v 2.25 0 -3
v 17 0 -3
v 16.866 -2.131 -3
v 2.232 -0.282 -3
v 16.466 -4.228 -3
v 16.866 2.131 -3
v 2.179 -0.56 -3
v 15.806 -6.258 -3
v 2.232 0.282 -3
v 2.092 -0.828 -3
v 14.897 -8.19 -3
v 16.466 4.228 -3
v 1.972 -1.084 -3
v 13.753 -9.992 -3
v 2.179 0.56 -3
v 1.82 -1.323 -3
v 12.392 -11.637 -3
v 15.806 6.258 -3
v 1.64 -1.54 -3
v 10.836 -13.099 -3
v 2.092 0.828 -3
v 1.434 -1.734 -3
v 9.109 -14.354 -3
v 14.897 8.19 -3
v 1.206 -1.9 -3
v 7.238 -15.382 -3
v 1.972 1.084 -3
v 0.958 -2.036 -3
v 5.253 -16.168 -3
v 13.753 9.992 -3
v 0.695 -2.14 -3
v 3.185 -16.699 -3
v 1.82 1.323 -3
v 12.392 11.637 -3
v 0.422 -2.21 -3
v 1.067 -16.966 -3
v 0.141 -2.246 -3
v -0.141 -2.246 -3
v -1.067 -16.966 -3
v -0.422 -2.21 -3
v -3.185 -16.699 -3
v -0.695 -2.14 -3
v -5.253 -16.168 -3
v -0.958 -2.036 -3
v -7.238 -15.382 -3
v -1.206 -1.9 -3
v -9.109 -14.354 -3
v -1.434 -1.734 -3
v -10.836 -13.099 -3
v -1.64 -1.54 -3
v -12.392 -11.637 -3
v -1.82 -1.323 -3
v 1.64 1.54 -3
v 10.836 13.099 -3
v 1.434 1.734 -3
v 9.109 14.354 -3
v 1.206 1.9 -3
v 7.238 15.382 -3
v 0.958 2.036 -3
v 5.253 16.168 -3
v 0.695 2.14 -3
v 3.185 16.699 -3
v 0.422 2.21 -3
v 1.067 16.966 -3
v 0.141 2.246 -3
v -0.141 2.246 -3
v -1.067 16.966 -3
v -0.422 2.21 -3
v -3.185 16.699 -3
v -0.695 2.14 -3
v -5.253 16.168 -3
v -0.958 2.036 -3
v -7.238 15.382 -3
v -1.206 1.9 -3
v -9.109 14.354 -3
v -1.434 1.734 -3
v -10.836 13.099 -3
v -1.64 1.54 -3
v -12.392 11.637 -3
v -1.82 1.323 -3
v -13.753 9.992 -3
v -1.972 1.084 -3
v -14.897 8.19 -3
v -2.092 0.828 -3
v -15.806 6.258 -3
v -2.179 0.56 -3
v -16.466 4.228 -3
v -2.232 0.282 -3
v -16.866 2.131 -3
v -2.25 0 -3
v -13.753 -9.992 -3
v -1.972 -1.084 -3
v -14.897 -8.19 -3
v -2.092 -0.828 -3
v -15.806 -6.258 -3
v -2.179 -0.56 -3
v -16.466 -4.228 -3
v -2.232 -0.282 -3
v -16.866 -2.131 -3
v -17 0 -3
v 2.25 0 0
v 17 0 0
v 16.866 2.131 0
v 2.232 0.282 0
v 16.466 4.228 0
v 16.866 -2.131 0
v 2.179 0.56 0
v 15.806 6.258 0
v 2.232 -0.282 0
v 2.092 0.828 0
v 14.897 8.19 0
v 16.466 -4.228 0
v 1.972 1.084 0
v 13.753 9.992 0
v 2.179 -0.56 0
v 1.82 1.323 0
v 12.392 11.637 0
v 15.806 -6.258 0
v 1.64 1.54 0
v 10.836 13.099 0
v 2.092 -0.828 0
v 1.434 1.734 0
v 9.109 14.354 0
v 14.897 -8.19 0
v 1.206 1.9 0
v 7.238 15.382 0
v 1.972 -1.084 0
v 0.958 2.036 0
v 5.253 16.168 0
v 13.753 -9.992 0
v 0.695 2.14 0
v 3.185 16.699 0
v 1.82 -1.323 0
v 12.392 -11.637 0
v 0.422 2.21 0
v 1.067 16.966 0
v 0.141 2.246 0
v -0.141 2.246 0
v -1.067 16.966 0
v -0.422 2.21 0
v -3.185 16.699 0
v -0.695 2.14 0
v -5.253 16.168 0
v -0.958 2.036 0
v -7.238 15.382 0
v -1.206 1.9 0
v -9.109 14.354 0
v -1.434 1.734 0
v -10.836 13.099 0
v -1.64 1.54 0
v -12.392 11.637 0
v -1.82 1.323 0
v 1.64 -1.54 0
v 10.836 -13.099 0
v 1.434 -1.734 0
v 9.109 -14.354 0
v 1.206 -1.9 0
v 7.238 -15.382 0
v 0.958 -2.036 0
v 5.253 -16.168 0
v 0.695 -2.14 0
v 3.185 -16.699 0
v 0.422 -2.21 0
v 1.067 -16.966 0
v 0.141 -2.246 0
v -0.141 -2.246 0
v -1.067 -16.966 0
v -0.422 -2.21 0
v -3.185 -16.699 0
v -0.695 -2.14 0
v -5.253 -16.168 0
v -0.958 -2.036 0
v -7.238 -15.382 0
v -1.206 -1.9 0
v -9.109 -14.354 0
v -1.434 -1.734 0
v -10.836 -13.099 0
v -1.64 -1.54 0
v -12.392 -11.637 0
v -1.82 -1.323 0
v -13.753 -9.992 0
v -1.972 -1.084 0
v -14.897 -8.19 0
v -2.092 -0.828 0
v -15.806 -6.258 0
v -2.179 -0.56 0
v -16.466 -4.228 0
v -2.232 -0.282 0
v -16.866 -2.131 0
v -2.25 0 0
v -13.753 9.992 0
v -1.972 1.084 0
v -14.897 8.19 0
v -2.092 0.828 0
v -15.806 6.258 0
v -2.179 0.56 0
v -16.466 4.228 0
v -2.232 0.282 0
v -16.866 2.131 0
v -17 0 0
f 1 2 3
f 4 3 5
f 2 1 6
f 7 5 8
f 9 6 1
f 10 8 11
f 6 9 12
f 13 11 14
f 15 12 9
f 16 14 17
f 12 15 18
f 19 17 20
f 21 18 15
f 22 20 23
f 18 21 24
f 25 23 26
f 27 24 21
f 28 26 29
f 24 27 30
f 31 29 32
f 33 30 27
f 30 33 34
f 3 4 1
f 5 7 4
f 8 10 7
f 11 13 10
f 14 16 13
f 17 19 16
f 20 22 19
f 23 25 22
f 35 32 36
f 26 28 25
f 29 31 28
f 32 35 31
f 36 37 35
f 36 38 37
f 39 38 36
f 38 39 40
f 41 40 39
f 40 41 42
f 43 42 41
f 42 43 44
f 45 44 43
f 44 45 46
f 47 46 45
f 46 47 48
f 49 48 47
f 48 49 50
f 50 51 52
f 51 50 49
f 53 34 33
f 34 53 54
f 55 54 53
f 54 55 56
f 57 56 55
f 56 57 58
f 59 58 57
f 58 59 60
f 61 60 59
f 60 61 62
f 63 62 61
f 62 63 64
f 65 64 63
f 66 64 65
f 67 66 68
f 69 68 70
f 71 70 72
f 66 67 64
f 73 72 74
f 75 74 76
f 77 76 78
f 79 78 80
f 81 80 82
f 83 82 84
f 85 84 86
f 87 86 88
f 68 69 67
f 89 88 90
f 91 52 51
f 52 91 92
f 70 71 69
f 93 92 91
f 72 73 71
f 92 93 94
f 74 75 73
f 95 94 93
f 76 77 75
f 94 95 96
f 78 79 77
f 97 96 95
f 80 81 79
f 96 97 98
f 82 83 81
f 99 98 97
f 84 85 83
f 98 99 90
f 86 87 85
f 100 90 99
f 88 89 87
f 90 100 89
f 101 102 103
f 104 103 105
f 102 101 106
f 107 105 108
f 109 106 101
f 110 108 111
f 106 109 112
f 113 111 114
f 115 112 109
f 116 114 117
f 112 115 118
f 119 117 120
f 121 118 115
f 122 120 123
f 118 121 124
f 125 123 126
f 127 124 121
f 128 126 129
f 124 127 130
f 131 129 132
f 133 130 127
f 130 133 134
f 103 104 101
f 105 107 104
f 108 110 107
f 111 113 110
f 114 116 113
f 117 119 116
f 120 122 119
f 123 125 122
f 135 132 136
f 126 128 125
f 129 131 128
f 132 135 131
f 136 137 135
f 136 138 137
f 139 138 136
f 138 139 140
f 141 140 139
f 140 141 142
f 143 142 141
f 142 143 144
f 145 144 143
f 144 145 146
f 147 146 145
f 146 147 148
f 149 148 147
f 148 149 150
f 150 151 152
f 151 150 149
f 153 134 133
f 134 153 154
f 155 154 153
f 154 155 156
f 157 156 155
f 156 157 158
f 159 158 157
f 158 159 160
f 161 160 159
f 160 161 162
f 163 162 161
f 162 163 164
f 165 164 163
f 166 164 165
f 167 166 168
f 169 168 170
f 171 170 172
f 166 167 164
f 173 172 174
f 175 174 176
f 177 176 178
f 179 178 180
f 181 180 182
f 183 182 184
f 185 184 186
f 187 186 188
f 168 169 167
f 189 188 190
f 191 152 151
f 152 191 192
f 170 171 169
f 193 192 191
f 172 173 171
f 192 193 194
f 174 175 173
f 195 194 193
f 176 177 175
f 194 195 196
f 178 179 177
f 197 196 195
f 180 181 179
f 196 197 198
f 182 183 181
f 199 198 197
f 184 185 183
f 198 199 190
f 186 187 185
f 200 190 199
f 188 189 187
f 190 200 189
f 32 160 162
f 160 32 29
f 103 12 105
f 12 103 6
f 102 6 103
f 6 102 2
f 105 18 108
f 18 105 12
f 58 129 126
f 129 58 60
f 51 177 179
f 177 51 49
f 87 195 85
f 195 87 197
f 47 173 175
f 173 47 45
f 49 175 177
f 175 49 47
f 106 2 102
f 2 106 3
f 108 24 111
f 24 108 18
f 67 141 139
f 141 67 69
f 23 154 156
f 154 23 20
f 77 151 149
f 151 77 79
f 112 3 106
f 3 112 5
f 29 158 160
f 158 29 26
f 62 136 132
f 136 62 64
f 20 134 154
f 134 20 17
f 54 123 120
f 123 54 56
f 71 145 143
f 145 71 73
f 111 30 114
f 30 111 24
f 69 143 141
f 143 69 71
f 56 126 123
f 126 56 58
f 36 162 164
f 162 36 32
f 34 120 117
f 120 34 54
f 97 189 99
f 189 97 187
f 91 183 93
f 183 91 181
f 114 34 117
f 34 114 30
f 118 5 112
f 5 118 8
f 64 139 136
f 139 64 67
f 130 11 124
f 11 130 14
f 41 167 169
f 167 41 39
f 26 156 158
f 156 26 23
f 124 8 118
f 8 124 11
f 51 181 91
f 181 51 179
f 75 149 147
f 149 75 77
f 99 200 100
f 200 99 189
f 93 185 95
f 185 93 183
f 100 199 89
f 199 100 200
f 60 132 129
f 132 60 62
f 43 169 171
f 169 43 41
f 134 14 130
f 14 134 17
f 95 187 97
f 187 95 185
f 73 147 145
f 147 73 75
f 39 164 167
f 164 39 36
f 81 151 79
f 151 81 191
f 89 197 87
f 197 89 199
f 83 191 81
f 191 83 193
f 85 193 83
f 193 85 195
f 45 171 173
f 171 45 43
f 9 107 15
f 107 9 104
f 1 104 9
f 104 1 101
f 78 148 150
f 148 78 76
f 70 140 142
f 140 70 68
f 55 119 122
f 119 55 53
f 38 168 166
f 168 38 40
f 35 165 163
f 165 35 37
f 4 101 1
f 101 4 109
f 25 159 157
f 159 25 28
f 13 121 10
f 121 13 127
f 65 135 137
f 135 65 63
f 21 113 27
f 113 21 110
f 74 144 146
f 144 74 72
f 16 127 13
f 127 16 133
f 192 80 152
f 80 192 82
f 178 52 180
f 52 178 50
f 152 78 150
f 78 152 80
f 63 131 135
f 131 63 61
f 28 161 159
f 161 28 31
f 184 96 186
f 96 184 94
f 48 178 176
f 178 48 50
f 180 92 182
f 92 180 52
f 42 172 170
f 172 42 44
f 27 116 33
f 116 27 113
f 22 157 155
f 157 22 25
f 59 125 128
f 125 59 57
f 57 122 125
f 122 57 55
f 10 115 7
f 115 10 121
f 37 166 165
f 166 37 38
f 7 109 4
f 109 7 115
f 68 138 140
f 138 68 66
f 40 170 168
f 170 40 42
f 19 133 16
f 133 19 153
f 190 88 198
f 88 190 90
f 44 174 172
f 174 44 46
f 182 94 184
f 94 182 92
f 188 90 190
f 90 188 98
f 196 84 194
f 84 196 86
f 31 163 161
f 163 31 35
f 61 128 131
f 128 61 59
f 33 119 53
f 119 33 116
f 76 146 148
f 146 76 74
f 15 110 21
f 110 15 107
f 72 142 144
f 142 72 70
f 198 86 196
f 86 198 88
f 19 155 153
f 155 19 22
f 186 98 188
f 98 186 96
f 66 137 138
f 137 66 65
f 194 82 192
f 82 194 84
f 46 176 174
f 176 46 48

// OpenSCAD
$fn = 50;


difference() {
	union() {
		translate(v = [0, 0, -3.0000000000]) {
			cylinder(h = 3, r = 7.0000000000);
		}
		translate(v = [0, 0, -3.0000000000]) {
			cylinder(h = 3, r = 17.0000000000);
		}
	}
	union() {
		#translate(v = [0, 0, -3]) {
			cylinder(h = 3, r = 2.2500000000);
		}
	}
}
